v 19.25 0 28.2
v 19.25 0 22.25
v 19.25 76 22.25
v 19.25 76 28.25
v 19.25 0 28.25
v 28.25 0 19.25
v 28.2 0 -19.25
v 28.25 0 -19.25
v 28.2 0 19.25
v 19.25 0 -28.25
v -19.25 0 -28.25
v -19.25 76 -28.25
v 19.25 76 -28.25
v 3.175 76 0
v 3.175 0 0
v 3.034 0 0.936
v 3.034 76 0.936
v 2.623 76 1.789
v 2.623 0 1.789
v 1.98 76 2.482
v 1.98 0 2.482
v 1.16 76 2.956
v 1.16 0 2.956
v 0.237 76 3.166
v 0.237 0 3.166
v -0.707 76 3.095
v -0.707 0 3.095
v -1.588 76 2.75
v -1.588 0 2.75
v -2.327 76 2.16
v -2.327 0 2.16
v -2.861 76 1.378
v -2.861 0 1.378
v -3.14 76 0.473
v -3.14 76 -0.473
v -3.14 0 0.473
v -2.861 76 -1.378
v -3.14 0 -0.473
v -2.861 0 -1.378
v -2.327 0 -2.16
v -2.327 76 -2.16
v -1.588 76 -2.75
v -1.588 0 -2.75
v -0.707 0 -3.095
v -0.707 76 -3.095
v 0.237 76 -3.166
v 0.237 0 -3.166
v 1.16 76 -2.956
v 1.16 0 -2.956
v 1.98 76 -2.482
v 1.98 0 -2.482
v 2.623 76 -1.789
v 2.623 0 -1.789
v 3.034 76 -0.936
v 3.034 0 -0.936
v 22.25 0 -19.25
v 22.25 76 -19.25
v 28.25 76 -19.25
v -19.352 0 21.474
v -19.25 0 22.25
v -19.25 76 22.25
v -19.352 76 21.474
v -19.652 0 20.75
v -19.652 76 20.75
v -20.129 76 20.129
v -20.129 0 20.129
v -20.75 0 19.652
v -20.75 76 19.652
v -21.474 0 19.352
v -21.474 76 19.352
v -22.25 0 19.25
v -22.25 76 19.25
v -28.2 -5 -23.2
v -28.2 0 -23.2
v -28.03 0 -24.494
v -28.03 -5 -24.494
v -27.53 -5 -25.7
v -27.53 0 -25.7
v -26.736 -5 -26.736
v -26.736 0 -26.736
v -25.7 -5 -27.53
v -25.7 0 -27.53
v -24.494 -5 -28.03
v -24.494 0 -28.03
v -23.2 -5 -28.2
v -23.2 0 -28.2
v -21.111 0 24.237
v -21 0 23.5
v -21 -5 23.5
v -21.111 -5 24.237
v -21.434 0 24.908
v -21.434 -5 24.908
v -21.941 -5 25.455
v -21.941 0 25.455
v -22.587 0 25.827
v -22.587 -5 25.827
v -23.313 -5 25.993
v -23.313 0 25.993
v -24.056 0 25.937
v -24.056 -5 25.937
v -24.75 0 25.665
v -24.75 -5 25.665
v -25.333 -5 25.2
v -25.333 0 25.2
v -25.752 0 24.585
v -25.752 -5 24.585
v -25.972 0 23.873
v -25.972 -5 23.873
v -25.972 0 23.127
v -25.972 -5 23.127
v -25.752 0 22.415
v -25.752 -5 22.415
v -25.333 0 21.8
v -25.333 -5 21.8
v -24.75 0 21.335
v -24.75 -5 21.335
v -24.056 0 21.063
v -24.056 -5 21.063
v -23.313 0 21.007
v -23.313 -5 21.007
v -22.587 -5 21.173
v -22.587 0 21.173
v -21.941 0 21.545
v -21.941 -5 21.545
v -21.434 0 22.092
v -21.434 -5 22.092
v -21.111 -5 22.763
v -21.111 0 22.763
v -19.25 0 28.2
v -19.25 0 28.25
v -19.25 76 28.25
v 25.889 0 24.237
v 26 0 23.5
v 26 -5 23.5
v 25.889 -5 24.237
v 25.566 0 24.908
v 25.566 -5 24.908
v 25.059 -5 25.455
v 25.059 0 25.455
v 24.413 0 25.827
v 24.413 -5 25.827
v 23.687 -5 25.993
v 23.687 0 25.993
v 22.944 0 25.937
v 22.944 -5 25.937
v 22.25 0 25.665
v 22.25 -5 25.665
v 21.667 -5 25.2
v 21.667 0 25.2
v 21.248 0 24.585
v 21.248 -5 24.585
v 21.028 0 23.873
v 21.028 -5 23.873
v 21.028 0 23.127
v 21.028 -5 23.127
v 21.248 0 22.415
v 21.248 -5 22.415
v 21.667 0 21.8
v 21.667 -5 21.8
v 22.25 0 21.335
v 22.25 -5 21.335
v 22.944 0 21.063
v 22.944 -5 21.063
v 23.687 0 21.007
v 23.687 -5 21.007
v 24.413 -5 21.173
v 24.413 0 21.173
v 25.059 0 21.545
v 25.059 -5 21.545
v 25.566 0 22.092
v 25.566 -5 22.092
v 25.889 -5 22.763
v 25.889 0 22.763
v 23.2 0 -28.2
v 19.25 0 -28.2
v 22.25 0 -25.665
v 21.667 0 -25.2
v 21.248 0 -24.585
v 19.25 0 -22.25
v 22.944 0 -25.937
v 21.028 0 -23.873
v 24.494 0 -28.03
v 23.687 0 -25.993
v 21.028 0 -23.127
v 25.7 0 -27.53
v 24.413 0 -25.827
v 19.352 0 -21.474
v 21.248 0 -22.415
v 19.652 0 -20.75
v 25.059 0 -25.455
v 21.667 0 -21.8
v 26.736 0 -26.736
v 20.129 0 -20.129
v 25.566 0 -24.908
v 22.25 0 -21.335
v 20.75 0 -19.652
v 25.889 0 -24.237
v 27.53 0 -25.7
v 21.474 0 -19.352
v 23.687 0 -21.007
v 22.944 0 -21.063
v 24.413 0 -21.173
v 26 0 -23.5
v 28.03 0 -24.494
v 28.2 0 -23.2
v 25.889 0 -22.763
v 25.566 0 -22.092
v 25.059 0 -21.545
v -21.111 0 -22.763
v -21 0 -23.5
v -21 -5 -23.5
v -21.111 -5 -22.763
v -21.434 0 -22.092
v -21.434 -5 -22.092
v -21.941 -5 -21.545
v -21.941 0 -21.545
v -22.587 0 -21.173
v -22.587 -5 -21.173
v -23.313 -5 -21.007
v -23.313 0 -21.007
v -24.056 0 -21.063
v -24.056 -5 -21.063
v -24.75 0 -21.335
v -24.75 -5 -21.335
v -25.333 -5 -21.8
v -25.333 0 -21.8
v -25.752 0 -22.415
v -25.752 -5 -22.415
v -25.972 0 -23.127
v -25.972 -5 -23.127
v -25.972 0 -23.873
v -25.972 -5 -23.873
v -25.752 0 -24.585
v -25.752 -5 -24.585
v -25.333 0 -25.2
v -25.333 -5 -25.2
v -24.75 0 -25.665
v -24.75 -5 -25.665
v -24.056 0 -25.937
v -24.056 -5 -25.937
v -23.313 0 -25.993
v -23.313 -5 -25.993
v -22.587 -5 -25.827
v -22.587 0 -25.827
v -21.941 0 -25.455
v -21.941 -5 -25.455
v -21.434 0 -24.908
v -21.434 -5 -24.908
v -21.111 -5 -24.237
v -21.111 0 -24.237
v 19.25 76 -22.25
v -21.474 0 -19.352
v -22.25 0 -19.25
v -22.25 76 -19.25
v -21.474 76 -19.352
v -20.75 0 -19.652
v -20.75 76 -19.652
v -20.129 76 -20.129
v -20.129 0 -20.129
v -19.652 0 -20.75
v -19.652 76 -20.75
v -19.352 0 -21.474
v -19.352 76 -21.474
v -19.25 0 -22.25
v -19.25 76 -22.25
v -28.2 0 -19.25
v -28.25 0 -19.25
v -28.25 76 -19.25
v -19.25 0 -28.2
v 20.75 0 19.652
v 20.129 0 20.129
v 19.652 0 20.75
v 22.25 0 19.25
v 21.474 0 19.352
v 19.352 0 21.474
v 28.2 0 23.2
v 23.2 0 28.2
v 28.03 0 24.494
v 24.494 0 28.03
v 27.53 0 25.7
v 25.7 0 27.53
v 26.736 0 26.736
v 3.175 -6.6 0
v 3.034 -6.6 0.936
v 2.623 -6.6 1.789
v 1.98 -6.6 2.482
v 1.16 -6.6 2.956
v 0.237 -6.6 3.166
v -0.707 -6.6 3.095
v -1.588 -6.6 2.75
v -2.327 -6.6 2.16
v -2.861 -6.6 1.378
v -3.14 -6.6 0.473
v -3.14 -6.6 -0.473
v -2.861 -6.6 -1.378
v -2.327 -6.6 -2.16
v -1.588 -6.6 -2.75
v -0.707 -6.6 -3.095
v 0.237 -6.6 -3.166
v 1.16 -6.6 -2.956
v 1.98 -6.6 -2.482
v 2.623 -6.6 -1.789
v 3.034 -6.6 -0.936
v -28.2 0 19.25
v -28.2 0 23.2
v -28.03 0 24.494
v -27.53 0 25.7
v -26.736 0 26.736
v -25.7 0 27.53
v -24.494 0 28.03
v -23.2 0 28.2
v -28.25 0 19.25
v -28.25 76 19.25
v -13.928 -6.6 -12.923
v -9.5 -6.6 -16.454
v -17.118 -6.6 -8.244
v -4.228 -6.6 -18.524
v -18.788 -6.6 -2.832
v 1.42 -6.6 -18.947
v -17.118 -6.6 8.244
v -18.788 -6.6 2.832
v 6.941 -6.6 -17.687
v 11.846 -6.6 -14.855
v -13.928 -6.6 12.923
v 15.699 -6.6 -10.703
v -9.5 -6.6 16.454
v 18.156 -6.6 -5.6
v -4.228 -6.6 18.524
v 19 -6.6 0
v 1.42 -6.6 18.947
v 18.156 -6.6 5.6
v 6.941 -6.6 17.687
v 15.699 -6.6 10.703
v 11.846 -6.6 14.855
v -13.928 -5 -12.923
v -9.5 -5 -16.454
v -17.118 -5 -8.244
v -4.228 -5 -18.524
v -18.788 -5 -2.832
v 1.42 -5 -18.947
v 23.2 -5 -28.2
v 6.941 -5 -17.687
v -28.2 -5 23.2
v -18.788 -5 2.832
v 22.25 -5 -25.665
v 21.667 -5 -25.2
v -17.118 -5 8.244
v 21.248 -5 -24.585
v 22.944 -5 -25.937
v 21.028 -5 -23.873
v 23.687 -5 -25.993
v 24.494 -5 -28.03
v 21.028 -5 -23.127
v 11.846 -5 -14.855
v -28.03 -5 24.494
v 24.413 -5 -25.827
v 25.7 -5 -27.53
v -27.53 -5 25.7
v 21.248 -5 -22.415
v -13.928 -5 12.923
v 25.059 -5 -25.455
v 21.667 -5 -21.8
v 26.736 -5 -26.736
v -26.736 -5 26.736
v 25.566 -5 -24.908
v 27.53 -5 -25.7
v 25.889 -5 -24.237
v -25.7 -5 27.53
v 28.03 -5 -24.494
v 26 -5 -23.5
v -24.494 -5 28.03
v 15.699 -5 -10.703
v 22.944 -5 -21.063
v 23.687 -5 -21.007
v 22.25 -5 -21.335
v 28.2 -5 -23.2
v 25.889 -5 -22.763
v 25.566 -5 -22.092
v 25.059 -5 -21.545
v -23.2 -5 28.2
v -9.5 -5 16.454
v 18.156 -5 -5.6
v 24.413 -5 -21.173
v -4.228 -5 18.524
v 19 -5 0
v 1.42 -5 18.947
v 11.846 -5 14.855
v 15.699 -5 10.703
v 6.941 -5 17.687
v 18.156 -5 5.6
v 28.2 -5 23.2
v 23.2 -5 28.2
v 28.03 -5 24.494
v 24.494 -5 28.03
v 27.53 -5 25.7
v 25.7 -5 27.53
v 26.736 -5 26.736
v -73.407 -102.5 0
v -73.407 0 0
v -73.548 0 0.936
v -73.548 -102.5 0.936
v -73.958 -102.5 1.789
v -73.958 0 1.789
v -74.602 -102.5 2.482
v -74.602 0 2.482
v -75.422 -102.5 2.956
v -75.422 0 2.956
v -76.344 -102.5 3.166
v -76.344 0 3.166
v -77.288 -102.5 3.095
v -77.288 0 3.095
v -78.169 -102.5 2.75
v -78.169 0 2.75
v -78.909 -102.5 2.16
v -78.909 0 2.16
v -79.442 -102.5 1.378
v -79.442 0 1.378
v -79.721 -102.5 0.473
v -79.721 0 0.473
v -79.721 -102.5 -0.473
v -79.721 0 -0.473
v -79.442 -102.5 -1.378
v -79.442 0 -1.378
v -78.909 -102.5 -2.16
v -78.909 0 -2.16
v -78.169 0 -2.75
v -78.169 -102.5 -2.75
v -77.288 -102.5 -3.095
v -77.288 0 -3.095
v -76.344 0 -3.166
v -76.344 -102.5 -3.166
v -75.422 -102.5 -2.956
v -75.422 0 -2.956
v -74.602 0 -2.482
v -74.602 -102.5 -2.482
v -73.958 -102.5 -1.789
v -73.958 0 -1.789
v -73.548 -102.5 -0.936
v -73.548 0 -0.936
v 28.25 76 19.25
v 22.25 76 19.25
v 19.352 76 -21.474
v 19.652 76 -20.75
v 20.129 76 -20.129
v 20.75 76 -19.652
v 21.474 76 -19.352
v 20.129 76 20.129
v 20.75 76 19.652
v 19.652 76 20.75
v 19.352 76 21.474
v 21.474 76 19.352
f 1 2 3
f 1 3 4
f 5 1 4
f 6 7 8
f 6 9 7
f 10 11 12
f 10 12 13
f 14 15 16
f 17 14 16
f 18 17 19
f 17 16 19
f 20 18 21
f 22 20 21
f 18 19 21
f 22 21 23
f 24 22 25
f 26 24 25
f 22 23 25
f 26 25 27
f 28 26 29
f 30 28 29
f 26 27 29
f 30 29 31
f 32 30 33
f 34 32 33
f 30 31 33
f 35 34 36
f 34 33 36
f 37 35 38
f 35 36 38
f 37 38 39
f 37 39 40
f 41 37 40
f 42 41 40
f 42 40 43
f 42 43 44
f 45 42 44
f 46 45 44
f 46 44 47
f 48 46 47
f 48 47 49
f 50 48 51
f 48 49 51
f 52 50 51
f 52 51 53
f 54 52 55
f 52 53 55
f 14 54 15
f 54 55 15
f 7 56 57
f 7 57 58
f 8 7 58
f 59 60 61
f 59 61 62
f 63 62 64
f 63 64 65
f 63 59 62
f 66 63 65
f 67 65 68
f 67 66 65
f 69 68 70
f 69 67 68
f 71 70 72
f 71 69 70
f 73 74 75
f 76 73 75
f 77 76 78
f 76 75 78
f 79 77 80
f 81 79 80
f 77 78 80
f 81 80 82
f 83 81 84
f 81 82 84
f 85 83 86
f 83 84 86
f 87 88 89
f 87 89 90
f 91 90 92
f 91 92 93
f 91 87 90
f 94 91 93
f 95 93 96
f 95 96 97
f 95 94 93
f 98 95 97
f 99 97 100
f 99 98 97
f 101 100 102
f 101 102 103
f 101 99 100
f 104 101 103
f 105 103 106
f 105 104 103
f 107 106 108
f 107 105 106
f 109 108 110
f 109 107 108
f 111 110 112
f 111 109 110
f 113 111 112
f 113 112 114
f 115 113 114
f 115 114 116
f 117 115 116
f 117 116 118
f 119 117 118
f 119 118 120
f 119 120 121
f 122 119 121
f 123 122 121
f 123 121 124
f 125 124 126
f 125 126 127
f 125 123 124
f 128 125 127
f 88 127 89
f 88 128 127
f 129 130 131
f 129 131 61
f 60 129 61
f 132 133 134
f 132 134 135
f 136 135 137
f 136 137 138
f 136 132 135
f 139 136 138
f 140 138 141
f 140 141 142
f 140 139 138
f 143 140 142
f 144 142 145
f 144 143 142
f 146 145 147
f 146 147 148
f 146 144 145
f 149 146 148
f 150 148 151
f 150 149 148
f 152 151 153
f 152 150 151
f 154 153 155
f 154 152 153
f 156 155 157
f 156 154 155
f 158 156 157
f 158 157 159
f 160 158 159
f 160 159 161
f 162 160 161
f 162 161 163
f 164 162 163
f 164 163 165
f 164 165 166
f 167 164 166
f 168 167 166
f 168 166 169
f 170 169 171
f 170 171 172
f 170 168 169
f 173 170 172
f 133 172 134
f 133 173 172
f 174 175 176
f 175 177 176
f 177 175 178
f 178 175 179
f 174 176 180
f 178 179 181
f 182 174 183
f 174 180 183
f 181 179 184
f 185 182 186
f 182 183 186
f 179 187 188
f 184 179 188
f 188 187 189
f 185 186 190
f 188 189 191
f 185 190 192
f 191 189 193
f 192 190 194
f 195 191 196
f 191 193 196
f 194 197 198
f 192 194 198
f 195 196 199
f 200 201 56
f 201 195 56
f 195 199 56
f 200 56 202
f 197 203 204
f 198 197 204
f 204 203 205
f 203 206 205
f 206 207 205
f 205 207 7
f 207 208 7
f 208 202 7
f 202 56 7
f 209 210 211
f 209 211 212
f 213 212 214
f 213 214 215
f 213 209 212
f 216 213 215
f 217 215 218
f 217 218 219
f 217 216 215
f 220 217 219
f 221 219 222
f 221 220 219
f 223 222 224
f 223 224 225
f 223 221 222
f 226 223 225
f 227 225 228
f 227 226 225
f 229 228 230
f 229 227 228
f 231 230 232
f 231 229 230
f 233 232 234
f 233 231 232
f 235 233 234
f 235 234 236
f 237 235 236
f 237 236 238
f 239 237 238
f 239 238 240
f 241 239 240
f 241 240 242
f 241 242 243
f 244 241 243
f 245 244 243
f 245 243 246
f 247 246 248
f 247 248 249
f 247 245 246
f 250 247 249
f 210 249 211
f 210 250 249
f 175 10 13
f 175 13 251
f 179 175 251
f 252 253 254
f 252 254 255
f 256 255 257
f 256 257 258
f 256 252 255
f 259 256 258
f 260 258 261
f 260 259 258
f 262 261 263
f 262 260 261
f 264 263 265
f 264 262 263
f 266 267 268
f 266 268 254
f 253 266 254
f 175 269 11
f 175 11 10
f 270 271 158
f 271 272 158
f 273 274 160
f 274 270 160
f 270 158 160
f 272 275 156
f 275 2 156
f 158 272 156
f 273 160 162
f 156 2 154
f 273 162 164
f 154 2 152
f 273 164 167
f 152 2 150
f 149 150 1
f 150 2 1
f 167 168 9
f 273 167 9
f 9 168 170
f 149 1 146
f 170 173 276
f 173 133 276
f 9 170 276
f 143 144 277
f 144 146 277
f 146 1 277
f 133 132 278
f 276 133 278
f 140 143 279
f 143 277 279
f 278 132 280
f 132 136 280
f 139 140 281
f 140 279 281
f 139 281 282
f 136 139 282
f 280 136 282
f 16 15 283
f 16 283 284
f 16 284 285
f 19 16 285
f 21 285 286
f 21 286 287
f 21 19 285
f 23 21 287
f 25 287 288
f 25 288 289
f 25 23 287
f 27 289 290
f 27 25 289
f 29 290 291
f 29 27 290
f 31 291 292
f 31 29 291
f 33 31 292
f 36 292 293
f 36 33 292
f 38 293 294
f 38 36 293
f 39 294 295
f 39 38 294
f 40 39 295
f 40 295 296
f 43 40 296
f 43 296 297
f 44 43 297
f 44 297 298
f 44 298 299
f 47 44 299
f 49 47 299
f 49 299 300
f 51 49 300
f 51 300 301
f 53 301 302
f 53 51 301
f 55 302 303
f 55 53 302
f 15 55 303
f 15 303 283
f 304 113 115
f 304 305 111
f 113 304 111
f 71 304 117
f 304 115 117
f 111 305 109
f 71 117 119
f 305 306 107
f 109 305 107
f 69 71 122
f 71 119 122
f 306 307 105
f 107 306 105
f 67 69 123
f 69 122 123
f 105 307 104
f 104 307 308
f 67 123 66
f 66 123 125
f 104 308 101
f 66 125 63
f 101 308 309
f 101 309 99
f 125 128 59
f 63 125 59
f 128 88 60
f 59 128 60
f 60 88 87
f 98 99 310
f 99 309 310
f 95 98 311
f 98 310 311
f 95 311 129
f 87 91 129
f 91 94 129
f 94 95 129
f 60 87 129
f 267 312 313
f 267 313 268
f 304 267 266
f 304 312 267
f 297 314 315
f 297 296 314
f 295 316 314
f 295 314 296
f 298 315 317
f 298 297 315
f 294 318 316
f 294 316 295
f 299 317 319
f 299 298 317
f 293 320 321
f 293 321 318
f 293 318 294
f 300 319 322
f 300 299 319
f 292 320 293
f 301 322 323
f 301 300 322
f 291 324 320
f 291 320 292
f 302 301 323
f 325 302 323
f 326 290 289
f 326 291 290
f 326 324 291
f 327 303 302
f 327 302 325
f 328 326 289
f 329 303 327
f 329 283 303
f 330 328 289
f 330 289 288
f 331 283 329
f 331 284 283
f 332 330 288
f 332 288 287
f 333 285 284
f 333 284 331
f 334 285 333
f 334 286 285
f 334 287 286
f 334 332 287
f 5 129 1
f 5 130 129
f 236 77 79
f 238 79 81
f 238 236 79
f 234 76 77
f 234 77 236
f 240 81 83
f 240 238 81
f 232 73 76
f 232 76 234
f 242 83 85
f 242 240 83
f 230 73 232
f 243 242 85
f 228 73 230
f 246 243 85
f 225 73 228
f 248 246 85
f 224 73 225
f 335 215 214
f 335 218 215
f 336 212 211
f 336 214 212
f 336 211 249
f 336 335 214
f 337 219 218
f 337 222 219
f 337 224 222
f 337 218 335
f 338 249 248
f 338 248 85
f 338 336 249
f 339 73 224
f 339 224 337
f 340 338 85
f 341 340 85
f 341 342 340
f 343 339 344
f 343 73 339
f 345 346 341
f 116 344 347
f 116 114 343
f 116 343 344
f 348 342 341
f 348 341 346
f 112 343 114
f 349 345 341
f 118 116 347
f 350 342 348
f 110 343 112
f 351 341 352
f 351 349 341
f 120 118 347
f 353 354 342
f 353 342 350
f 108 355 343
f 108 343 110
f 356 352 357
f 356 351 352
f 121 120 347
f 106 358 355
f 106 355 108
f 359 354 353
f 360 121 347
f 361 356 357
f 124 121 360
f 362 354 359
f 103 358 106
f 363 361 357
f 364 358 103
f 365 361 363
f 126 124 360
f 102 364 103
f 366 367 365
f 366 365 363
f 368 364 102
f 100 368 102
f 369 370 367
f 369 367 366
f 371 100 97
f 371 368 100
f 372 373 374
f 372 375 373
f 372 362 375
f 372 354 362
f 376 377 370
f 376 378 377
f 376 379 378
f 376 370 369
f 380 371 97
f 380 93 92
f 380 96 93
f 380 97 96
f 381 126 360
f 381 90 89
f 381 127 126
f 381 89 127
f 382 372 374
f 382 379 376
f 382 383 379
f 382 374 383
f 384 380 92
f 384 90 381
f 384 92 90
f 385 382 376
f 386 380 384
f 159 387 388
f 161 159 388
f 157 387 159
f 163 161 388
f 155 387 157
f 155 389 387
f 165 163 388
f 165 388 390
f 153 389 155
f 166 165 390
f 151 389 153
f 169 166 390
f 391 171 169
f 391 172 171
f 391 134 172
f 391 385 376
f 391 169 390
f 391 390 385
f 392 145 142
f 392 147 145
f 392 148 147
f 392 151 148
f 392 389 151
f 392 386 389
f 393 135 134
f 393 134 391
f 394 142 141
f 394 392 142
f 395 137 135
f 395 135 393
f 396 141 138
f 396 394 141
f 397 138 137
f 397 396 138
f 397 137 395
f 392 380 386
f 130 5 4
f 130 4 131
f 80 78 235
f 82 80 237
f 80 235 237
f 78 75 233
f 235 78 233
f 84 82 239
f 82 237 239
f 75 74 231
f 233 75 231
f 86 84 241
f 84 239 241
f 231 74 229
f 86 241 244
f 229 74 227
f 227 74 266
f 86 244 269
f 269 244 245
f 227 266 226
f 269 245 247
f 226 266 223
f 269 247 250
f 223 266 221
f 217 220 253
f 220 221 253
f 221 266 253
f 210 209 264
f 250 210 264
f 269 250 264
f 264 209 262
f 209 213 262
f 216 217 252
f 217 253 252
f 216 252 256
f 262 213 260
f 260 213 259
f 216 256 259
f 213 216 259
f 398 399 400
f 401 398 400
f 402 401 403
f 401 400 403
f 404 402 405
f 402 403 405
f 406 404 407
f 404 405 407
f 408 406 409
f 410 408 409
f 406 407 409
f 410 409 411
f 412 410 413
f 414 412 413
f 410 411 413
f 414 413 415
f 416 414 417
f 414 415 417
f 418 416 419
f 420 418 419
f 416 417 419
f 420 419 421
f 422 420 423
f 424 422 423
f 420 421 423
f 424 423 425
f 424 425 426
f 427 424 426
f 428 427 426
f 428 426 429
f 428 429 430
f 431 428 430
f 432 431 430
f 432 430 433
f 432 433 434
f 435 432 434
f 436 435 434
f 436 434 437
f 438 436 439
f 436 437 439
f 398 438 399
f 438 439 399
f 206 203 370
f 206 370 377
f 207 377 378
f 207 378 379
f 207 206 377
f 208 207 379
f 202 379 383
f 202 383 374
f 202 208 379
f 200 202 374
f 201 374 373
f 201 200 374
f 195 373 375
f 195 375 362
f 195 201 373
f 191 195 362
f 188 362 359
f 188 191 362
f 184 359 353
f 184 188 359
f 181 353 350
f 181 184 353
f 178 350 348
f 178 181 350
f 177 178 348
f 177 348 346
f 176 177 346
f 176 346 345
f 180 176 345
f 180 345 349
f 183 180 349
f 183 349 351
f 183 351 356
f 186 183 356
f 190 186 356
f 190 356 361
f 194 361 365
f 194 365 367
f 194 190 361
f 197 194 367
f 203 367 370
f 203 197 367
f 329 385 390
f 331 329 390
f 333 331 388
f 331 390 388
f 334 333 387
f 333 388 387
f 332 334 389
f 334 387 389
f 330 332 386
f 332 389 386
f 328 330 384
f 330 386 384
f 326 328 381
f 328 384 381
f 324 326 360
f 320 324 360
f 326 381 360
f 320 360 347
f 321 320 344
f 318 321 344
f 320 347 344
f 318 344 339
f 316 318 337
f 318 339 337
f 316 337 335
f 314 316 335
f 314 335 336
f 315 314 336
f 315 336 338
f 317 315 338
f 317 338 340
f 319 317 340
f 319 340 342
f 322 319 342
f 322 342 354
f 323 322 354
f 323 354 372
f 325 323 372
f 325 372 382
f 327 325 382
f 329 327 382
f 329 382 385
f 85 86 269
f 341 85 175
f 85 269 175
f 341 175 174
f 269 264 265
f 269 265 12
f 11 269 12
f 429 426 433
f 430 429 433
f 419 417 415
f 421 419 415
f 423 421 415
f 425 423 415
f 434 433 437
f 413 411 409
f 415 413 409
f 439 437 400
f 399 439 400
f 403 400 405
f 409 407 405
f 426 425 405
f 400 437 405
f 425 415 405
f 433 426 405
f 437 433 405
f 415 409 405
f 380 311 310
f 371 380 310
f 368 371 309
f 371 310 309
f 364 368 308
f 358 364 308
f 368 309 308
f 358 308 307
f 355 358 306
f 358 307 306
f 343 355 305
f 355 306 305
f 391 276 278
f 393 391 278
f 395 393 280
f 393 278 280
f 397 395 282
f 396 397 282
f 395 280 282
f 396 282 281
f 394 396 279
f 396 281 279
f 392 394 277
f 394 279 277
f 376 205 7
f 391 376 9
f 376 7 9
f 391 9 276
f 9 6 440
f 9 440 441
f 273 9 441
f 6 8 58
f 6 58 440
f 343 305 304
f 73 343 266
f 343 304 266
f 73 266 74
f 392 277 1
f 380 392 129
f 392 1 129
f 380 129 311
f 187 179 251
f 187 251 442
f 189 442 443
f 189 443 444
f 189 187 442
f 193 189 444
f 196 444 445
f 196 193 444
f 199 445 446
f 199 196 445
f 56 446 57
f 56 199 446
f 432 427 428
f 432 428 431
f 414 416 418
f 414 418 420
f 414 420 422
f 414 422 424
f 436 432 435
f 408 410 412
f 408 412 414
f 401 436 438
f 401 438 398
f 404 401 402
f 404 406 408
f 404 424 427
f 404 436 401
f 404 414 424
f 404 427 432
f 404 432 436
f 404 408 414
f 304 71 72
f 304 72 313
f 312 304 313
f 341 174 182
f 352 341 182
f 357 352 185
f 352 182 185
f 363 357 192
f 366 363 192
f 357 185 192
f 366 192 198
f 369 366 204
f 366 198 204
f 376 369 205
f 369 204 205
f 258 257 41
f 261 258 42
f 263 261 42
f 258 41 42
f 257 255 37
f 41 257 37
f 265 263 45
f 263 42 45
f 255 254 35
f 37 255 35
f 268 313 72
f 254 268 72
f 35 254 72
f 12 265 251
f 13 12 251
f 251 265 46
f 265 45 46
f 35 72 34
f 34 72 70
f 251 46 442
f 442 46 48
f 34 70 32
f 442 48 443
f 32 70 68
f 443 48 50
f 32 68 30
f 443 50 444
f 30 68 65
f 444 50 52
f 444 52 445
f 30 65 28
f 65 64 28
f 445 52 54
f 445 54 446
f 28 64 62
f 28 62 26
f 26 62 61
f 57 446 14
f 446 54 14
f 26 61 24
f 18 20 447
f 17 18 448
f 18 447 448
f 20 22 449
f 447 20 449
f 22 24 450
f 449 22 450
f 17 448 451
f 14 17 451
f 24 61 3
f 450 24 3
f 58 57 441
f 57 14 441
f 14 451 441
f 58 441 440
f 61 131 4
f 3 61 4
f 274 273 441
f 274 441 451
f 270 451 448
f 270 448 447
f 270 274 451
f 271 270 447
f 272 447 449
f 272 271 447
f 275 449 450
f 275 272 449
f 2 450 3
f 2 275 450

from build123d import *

# Parameters (mm, degrees)
F0_R     = 2.5
F0_R_2   = 19
F1_DEPTH = 5
F0_R_3   = 3.175
F2_DEPTH = 6.6
F3_R     = 3.175
F4_DEPTH = 76
F5_DEPTH = 102.5


with BuildPart() as f1:
    # F0 (on Front) → F1 (new body)
    with BuildSketch(Plane.XZ):
        with BuildLine():
            Line((23.2, 28.2), (-23.2, 28.2))
            ThreePointArc((-23.2, 28.2), (-26.735534, 26.735534), (-28.2, 23.2))
            Line((-28.2, 23.2), (-28.2, -23.2))
            ThreePointArc((-28.2, -23.2), (-26.735534, -26.735534), (-23.2, -28.2))
            Line((-23.2, -28.2), (23.2, -28.2))
            ThreePointArc((23.2, -28.2), (26.735534, -26.735534), (28.2, -23.2))
            Line((28.2, -23.2), (28.2, 23.2))
            ThreePointArc((28.2, 23.2), (26.735534, 26.735534), (23.2, 28.2))
        make_face()
        with Locations((-23.5, -23.5)):
            Circle(F0_R, mode=Mode.SUBTRACT)
        with Locations((23.5, -23.5)):
            Circle(F0_R, mode=Mode.SUBTRACT)
        Circle(F0_R_2, mode=Mode.SUBTRACT)
        with Locations((-23.5, 23.5)):
            Circle(F0_R, mode=Mode.SUBTRACT)
        with Locations((23.5, 23.5)):
            Circle(F0_R, mode=Mode.SUBTRACT)
    extrude(amount=F1_DEPTH)

    # F0 (on Front) → F2 (join)
    with BuildSketch(Plane.XZ):
        Circle(F0_R_2)
        Circle(F0_R_3, mode=Mode.SUBTRACT)
    extrude(amount=F2_DEPTH)

    # F3 (on face) → F4 (join)
    with BuildSketch(Plane.XZ):
        with BuildLine():
            Line((28.25, -19.25), (28.25, 19.25))
            Line((28.25, 19.25), (22.25, 19.25))
            ThreePointArc((22.25, 19.25), (20.12868, 20.12868), (19.25, 22.25))
            Line((19.25, 22.25), (19.25, 28.25))
            Line((19.25, 28.25), (-19.25, 28.25))
            Line((-19.25, 28.25), (-19.25, 22.25))
            ThreePointArc((-19.25, 22.25), (-20.12868, 20.12868), (-22.25, 19.25))
            Line((-22.25, 19.25), (-28.25, 19.25))
            Line((-28.25, 19.25), (-28.25, -19.25))
            Line((-28.25, -19.25), (-22.25, -19.25))
            ThreePointArc((-22.25, -19.25), (-20.12868, -20.12868), (-19.25, -22.25))
            Line((-19.25, -22.25), (-19.25, -28.25))
            Line((-19.25, -28.25), (19.25, -28.25))
            Line((19.25, -28.25), (19.25, -22.25))
            ThreePointArc((19.25, -22.25), (20.12868, -20.12868), (22.25, -19.25))
            Line((22.25, -19.25), (28.25, -19.25))
        make_face()
        Circle(F3_R, mode=Mode.SUBTRACT)
    extrude(amount=-F4_DEPTH)


with BuildPart() as f5:
    # F0 (on Front) → F5 (new body)
    with BuildSketch(Plane.XZ):
        with Locations((-76.581754, 0)):
            Circle(F0_R_3)
    extrude(amount=F5_DEPTH)


solid = Compound([f1.part, f5.part])
